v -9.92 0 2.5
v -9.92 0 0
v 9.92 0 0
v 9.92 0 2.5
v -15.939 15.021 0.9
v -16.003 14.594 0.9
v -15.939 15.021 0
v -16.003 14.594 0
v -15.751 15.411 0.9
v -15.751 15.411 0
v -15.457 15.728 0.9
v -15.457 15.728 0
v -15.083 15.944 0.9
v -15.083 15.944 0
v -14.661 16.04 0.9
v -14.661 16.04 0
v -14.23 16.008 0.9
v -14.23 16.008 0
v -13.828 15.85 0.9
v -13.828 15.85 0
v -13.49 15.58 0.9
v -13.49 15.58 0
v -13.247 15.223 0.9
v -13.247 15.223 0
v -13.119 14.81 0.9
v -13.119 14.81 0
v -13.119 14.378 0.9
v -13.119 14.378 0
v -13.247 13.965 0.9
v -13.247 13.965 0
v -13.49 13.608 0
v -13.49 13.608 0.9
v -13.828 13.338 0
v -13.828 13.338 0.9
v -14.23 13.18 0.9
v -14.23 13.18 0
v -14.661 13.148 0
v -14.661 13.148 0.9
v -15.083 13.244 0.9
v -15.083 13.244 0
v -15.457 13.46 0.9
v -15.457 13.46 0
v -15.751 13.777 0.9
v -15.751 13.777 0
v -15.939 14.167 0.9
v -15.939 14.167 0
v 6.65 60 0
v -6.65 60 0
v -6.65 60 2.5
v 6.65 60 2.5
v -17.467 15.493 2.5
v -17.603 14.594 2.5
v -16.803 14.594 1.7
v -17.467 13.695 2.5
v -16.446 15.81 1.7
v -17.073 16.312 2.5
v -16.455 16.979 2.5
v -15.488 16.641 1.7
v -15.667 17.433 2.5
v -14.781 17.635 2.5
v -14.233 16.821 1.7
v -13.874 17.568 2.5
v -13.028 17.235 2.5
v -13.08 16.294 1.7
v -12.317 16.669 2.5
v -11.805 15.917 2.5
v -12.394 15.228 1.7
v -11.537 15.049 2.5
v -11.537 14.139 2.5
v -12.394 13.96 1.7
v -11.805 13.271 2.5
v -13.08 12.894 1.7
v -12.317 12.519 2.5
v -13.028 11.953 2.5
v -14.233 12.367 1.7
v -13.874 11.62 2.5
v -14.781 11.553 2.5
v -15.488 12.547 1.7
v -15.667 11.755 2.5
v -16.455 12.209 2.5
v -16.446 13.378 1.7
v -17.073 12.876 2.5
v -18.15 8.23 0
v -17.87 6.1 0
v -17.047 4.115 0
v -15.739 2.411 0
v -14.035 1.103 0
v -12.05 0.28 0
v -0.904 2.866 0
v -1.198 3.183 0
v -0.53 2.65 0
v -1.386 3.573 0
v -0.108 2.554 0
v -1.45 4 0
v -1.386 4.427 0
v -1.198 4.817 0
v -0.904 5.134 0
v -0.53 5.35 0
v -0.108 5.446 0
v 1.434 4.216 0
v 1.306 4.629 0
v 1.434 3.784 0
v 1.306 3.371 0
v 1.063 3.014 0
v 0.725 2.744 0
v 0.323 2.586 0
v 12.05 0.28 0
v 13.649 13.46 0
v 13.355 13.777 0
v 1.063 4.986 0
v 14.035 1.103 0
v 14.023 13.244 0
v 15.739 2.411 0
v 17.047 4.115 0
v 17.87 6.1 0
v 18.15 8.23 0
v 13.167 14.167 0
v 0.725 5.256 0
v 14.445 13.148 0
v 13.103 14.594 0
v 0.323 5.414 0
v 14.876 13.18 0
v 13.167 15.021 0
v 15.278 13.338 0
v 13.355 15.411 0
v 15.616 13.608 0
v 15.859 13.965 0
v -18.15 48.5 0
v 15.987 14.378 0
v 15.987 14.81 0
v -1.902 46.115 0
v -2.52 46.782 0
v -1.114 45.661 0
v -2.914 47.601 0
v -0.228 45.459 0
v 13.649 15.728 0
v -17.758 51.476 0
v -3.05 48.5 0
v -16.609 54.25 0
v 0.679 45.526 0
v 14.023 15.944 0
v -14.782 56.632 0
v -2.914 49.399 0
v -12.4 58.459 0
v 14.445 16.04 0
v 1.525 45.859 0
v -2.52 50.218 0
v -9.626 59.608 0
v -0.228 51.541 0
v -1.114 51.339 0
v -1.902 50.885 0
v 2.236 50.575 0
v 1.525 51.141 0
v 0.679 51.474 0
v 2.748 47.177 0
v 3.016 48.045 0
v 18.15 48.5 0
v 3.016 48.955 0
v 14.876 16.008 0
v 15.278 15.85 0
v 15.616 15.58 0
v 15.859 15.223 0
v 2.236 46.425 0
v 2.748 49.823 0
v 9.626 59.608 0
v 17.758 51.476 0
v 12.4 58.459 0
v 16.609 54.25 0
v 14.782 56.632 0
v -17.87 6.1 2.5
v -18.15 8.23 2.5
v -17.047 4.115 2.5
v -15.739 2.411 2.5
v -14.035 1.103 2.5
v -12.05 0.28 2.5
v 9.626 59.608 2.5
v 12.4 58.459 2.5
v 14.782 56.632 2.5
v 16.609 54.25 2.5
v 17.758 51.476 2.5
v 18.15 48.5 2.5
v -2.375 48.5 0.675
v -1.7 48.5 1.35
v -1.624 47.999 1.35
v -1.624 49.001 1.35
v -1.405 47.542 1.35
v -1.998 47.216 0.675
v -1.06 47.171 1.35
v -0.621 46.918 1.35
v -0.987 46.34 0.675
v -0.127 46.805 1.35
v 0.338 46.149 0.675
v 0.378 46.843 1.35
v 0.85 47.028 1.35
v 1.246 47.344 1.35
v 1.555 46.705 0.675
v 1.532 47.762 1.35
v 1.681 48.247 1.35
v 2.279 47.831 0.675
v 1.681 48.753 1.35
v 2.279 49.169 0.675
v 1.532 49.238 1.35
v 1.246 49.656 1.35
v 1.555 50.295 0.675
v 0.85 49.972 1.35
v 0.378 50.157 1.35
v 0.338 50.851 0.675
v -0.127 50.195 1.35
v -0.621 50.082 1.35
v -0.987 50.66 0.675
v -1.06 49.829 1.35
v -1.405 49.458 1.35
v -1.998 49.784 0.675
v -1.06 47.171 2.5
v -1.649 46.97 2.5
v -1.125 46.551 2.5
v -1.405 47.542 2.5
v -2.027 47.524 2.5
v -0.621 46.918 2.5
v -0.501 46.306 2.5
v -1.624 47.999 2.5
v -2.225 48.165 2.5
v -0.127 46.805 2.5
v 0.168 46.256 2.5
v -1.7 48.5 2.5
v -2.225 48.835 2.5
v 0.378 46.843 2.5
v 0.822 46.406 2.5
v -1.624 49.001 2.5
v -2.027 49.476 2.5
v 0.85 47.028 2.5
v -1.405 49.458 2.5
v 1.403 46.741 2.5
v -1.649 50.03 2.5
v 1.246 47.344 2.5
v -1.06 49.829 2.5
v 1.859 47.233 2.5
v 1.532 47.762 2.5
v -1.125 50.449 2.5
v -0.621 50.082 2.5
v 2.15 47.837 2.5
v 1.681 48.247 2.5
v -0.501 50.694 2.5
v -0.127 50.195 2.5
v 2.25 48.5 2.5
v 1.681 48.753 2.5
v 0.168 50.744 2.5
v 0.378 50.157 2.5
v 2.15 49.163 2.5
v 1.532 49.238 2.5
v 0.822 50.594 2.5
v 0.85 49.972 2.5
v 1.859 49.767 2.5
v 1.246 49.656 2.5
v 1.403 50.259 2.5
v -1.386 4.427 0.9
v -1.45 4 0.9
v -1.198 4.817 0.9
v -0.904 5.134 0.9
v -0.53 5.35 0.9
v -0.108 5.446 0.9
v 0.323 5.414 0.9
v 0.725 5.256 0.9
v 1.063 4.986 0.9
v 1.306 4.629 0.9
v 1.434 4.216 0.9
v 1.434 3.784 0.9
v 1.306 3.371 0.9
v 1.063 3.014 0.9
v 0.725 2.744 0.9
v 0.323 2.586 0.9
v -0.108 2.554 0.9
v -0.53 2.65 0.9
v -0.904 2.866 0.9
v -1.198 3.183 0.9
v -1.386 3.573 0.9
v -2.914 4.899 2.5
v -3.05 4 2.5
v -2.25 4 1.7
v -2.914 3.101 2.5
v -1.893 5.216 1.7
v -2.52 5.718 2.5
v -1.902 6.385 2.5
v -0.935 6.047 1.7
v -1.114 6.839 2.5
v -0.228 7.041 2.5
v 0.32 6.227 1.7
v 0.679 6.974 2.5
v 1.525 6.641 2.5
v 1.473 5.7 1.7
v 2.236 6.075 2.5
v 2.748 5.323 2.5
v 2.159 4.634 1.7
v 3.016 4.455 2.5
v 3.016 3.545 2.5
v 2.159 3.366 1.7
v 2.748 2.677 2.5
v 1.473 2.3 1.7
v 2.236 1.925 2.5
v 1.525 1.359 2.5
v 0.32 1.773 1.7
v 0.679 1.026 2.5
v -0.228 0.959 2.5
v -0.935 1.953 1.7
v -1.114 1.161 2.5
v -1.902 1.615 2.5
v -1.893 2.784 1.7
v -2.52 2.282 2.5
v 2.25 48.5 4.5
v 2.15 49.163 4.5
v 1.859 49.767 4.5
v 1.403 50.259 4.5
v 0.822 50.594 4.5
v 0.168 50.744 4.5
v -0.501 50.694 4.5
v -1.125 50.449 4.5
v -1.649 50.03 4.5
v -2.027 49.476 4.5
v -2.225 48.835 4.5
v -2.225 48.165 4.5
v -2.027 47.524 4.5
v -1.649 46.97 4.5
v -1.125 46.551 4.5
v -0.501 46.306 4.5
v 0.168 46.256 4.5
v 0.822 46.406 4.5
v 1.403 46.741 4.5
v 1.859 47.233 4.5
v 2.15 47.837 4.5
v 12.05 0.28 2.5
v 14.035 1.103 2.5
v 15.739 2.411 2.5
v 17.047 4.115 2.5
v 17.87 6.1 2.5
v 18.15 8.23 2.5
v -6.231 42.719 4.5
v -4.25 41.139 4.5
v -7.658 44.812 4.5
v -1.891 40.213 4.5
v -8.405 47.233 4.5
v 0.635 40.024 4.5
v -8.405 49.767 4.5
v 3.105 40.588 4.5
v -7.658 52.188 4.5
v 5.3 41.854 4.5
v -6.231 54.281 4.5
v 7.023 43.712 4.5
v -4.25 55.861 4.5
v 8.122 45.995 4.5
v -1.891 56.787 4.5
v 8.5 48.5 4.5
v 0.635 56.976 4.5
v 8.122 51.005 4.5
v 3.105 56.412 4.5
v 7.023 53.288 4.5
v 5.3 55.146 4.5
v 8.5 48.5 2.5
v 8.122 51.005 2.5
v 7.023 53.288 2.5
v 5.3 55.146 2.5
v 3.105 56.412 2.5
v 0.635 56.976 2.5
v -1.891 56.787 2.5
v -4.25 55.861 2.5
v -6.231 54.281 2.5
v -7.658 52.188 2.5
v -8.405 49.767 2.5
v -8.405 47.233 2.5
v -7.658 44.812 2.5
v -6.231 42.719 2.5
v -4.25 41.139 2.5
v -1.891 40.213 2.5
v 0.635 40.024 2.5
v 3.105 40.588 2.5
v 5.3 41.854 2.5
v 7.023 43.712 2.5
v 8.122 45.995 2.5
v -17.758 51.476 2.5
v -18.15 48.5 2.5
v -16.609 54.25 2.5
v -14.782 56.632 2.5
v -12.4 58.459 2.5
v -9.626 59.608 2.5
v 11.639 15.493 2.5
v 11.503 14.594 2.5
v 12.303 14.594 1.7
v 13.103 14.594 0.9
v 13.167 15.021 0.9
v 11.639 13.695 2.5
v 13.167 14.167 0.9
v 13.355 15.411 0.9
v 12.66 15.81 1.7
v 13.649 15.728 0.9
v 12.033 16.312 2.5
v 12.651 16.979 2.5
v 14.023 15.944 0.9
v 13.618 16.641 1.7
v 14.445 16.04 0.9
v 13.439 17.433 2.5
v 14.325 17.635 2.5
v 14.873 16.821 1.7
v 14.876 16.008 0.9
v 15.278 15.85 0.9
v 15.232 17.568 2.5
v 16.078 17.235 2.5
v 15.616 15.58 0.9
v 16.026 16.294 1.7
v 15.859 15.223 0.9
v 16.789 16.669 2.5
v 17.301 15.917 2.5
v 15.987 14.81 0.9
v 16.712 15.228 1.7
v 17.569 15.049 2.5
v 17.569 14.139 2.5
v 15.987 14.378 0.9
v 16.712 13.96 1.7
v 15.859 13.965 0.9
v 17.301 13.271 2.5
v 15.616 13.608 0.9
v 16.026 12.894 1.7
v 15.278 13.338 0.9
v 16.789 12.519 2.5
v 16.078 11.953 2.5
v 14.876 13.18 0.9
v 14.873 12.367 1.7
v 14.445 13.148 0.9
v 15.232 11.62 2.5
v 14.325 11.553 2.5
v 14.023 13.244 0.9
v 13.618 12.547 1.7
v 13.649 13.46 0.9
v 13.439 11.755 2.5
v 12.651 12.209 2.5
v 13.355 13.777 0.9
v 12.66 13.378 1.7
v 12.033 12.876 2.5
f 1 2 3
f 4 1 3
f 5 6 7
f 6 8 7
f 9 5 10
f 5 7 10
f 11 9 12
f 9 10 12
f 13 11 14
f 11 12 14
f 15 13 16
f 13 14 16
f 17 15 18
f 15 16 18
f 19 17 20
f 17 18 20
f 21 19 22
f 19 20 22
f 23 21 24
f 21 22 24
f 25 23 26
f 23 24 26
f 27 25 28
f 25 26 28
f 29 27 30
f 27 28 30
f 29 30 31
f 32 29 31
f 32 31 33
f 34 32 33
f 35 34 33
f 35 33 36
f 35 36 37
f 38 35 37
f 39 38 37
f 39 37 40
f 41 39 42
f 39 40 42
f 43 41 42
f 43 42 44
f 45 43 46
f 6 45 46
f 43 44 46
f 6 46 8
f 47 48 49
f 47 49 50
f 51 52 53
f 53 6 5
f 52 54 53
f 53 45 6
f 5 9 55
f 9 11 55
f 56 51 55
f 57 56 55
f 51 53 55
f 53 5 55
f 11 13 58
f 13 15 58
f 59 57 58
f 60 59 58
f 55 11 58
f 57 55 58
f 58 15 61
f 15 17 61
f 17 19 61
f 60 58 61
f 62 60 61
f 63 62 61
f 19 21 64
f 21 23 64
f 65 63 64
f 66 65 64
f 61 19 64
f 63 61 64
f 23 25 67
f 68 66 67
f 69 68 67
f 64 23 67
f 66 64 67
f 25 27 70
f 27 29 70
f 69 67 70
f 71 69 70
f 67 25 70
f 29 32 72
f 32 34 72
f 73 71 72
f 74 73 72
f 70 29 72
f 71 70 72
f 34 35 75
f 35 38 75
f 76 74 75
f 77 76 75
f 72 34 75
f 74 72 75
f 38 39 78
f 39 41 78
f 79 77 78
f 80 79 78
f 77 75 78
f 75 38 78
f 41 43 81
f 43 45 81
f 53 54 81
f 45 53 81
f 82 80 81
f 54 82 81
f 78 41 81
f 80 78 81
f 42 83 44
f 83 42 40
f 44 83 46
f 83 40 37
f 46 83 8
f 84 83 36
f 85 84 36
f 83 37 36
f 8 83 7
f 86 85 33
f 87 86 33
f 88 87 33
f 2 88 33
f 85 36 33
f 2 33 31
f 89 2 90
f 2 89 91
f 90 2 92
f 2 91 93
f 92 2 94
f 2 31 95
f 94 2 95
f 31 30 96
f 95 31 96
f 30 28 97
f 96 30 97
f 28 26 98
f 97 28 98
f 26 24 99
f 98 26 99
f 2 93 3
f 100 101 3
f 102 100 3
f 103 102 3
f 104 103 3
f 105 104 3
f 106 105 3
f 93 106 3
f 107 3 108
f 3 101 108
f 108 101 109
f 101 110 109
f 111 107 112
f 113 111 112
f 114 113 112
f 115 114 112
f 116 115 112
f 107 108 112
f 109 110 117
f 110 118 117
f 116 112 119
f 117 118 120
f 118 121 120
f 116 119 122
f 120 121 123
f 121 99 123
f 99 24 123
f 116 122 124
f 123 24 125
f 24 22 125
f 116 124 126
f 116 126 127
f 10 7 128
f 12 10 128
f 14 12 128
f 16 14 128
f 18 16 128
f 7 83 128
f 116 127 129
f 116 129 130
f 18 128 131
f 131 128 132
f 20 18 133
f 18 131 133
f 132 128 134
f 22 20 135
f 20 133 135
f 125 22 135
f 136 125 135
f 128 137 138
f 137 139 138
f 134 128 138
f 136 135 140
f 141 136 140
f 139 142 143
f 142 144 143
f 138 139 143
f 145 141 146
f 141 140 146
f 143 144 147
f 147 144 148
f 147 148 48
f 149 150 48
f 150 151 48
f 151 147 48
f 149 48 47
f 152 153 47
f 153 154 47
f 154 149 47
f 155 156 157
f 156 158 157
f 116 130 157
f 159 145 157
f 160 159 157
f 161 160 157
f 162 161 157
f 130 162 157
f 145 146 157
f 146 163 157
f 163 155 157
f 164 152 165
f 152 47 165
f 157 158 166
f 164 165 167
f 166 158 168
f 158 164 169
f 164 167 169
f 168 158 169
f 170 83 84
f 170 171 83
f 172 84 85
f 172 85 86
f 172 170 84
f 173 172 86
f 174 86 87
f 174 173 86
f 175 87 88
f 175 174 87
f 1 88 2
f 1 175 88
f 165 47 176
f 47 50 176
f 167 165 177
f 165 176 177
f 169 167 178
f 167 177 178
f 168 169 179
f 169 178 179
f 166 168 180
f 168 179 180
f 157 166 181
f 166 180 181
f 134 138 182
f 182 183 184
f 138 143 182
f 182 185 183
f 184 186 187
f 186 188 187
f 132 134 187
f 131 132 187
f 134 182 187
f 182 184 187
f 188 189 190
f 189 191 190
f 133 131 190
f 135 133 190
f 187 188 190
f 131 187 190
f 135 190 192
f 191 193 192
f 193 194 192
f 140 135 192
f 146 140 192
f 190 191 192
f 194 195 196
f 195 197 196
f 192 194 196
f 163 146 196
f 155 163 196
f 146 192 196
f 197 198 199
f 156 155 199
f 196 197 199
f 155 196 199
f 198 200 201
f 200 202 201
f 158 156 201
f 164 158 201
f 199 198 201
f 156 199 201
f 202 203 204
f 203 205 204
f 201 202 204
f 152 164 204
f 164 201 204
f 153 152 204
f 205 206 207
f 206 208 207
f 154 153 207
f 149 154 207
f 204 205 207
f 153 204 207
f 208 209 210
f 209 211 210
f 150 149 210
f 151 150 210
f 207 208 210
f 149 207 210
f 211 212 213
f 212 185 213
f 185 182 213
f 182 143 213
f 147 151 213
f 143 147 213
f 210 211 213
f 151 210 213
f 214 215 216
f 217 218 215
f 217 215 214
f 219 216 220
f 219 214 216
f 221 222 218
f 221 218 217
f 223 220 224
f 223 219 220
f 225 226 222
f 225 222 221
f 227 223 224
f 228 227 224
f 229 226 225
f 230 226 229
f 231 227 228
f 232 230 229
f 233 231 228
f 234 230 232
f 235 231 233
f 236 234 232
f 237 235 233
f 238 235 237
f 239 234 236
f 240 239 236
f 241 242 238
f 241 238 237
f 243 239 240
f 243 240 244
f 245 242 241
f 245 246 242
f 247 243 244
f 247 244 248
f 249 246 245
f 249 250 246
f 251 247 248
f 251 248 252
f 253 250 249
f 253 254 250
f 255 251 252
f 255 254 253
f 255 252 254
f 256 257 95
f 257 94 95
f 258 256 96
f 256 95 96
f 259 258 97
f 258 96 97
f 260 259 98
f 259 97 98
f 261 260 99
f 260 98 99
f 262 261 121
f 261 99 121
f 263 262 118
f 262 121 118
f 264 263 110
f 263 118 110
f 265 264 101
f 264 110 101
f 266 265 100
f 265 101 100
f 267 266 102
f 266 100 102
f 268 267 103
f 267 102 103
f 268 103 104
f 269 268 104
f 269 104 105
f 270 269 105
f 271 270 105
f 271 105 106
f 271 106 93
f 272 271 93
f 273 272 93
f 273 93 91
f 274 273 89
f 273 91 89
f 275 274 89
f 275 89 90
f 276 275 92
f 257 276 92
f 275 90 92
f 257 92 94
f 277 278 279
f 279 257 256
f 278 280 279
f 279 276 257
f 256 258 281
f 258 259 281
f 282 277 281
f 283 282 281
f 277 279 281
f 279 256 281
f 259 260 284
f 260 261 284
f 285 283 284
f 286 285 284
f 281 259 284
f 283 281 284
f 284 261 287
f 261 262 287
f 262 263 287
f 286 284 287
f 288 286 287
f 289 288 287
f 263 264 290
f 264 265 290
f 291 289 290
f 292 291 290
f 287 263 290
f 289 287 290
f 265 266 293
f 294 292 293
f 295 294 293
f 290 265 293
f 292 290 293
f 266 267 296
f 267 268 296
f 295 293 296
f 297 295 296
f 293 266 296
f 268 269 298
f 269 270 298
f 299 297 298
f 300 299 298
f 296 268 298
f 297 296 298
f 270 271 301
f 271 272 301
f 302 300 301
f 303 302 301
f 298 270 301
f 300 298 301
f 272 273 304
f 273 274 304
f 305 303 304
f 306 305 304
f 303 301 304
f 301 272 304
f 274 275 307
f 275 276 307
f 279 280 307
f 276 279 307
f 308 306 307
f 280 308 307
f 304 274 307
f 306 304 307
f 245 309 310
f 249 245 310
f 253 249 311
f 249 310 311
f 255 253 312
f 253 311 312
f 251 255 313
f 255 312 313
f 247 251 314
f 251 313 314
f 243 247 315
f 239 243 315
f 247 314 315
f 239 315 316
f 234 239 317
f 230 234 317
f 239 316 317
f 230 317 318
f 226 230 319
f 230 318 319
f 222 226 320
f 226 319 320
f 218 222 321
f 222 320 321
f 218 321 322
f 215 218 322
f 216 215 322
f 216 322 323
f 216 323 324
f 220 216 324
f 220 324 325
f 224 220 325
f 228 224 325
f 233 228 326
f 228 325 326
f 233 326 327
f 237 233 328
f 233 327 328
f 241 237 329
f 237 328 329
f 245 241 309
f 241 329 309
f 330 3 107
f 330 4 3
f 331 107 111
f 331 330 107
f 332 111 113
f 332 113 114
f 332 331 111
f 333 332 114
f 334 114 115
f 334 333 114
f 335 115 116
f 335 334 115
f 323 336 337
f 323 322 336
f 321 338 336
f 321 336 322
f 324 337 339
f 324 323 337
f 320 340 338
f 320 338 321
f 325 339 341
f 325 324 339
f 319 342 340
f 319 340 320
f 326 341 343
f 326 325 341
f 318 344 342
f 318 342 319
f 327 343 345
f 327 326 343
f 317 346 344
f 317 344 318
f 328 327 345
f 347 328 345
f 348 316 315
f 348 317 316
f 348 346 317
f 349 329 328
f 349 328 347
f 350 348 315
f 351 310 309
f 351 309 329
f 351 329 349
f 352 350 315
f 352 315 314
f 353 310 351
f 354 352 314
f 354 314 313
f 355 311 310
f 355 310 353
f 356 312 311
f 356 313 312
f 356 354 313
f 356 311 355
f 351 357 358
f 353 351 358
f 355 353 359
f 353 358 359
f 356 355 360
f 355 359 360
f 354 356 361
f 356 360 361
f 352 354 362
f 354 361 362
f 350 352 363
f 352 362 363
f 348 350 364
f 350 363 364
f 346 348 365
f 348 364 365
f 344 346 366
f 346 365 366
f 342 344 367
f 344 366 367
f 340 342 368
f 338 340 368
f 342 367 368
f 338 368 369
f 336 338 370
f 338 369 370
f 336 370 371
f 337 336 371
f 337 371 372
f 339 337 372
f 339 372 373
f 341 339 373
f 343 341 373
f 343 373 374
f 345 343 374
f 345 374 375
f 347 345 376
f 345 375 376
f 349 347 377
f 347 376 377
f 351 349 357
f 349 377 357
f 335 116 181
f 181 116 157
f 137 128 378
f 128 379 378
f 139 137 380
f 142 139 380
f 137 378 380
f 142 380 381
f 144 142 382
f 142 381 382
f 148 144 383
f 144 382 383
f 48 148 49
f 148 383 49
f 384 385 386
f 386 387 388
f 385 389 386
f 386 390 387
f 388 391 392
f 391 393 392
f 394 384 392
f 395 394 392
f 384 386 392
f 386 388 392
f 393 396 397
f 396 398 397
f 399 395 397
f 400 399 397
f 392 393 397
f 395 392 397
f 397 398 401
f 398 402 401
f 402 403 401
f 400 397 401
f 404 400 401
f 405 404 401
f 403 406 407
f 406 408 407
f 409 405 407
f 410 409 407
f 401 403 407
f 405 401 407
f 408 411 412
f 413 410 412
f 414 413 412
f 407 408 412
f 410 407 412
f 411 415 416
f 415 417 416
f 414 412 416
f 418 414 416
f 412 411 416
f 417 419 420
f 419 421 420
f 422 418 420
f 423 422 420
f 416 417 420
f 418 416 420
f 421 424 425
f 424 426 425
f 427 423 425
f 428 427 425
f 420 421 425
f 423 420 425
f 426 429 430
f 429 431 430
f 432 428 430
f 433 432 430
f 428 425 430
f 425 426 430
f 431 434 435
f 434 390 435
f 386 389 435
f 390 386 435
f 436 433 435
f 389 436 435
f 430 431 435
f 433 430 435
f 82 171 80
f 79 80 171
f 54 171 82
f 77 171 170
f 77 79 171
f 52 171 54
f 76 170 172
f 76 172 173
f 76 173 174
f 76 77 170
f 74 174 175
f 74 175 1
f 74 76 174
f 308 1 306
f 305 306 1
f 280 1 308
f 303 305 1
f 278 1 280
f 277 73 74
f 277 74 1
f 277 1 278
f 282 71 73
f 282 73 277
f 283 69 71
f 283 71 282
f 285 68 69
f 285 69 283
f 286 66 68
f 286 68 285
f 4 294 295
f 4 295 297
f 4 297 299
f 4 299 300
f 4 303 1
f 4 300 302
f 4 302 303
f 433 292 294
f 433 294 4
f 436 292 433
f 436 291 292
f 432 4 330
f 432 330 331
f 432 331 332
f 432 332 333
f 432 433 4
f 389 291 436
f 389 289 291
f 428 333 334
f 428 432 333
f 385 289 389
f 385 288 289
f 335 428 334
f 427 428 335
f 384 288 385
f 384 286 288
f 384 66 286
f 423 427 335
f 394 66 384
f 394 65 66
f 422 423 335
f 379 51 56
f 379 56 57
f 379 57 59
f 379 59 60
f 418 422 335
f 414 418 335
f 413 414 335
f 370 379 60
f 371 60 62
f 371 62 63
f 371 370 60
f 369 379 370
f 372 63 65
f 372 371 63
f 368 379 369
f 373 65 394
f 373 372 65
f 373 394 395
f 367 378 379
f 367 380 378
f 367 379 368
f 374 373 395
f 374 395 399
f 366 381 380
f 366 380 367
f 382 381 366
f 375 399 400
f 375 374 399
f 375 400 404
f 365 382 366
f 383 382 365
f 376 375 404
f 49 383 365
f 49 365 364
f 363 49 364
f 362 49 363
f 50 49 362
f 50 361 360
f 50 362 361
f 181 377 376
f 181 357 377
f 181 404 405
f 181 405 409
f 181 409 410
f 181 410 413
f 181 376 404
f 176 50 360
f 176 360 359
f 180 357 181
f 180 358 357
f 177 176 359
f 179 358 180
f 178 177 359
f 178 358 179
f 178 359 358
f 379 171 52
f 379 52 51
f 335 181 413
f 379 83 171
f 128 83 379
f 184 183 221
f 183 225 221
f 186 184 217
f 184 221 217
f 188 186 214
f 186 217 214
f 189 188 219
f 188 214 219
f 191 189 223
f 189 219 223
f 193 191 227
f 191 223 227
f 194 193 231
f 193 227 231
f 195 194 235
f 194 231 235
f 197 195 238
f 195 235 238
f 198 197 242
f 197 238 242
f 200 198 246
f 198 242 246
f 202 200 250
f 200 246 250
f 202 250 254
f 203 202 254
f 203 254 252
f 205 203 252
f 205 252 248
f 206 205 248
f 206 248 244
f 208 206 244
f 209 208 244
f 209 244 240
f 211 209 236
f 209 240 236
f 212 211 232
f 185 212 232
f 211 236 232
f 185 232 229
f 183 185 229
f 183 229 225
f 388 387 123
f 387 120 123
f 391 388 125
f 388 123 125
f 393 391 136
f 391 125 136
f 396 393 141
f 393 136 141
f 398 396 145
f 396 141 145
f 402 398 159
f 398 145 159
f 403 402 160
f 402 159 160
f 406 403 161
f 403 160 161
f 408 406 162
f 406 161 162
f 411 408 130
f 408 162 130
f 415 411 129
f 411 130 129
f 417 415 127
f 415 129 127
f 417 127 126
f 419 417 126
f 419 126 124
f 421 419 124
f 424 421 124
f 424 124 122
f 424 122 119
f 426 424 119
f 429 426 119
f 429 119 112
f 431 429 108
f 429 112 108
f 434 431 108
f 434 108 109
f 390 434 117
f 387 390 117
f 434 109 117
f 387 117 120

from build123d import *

# Parameters (mm, degrees)
SKETCH_W            = 36.3
SKETCH_H            = 60
PAD_DEPTH           = 2.5
FILLET_R            = 8.23
FILLET001_R         = 11.5
HOLE_D              = 2.9
HOLE_DEPTH          = 25
HOLE_CSINK_D        = 6.1
HOLE_CSINK_ANGLE    = 90
SKETCH002_R         = 8.5
PAD001_DEPTH        = 2
SKETCH003_R         = 2.25
POCKET_DEPTH        = 2
HOLE001_D           = 3.4
HOLE001_DEPTH       = 25
HOLE001_CSINK_D     = 6.1
HOLE001_CSINK_ANGLE = 90


with BuildPart() as part:
    # Sketch → Pad (new body)
    with BuildSketch(Plane.XY):
        with Locations((0, 30)):
            Rectangle(SKETCH_W, SKETCH_H)
    extrude(amount=PAD_DEPTH)

    # Fillet
    fillet_edges = [part.edges().sort_by_distance(p)[0] for p in [
        (18.15, 0, 1.25),
        (-18.15, 0, 1.25),
    ]]
    fillet(fillet_edges, radius=FILLET_R)

    # Fillet001
    fillet001_edges = [part.edges().sort_by_distance(p)[0] for p in [
        (-18.15, 60, 1.25),
        (18.15, 60, 1.25),
    ]]
    fillet(fillet001_edges, radius=FILLET001_R)

    # Hole
    with Locations(Plane.XY.offset(2.5)):
        with Locations((0, 4), (-14.553, 14.594), (14.553, 14.594)):
            CounterSinkHole(HOLE_D / 2, HOLE_CSINK_D / 2, depth=HOLE_DEPTH, counter_sink_angle=HOLE_CSINK_ANGLE)

    # Sketch002 (on Face5 of Hole) → Pad001 (join)
    with BuildSketch(Plane.XY.offset(2.5)):
        with Locations((0, 48.5)):
            Circle(SKETCH002_R)
    extrude(amount=PAD001_DEPTH)

    # Sketch003 (on Face18 of Pad001) → Pocket (cut)
    with BuildSketch(Plane.XY.offset(4.5)):
        with Locations((0, 48.5)):
            Circle(SKETCH003_R)
    extrude(amount=-POCKET_DEPTH, mode=Mode.SUBTRACT)

    # Hole001
    with Locations(Plane(origin=(0, 0, 0), x_dir=(1, 0, 0), z_dir=(0, 0, -1))):
        with Locations((0, -48.5)):
            CounterSinkHole(HOLE001_D / 2, HOLE001_CSINK_D / 2, depth=HOLE001_DEPTH, counter_sink_angle=HOLE001_CSINK_ANGLE)


solid = part.part
